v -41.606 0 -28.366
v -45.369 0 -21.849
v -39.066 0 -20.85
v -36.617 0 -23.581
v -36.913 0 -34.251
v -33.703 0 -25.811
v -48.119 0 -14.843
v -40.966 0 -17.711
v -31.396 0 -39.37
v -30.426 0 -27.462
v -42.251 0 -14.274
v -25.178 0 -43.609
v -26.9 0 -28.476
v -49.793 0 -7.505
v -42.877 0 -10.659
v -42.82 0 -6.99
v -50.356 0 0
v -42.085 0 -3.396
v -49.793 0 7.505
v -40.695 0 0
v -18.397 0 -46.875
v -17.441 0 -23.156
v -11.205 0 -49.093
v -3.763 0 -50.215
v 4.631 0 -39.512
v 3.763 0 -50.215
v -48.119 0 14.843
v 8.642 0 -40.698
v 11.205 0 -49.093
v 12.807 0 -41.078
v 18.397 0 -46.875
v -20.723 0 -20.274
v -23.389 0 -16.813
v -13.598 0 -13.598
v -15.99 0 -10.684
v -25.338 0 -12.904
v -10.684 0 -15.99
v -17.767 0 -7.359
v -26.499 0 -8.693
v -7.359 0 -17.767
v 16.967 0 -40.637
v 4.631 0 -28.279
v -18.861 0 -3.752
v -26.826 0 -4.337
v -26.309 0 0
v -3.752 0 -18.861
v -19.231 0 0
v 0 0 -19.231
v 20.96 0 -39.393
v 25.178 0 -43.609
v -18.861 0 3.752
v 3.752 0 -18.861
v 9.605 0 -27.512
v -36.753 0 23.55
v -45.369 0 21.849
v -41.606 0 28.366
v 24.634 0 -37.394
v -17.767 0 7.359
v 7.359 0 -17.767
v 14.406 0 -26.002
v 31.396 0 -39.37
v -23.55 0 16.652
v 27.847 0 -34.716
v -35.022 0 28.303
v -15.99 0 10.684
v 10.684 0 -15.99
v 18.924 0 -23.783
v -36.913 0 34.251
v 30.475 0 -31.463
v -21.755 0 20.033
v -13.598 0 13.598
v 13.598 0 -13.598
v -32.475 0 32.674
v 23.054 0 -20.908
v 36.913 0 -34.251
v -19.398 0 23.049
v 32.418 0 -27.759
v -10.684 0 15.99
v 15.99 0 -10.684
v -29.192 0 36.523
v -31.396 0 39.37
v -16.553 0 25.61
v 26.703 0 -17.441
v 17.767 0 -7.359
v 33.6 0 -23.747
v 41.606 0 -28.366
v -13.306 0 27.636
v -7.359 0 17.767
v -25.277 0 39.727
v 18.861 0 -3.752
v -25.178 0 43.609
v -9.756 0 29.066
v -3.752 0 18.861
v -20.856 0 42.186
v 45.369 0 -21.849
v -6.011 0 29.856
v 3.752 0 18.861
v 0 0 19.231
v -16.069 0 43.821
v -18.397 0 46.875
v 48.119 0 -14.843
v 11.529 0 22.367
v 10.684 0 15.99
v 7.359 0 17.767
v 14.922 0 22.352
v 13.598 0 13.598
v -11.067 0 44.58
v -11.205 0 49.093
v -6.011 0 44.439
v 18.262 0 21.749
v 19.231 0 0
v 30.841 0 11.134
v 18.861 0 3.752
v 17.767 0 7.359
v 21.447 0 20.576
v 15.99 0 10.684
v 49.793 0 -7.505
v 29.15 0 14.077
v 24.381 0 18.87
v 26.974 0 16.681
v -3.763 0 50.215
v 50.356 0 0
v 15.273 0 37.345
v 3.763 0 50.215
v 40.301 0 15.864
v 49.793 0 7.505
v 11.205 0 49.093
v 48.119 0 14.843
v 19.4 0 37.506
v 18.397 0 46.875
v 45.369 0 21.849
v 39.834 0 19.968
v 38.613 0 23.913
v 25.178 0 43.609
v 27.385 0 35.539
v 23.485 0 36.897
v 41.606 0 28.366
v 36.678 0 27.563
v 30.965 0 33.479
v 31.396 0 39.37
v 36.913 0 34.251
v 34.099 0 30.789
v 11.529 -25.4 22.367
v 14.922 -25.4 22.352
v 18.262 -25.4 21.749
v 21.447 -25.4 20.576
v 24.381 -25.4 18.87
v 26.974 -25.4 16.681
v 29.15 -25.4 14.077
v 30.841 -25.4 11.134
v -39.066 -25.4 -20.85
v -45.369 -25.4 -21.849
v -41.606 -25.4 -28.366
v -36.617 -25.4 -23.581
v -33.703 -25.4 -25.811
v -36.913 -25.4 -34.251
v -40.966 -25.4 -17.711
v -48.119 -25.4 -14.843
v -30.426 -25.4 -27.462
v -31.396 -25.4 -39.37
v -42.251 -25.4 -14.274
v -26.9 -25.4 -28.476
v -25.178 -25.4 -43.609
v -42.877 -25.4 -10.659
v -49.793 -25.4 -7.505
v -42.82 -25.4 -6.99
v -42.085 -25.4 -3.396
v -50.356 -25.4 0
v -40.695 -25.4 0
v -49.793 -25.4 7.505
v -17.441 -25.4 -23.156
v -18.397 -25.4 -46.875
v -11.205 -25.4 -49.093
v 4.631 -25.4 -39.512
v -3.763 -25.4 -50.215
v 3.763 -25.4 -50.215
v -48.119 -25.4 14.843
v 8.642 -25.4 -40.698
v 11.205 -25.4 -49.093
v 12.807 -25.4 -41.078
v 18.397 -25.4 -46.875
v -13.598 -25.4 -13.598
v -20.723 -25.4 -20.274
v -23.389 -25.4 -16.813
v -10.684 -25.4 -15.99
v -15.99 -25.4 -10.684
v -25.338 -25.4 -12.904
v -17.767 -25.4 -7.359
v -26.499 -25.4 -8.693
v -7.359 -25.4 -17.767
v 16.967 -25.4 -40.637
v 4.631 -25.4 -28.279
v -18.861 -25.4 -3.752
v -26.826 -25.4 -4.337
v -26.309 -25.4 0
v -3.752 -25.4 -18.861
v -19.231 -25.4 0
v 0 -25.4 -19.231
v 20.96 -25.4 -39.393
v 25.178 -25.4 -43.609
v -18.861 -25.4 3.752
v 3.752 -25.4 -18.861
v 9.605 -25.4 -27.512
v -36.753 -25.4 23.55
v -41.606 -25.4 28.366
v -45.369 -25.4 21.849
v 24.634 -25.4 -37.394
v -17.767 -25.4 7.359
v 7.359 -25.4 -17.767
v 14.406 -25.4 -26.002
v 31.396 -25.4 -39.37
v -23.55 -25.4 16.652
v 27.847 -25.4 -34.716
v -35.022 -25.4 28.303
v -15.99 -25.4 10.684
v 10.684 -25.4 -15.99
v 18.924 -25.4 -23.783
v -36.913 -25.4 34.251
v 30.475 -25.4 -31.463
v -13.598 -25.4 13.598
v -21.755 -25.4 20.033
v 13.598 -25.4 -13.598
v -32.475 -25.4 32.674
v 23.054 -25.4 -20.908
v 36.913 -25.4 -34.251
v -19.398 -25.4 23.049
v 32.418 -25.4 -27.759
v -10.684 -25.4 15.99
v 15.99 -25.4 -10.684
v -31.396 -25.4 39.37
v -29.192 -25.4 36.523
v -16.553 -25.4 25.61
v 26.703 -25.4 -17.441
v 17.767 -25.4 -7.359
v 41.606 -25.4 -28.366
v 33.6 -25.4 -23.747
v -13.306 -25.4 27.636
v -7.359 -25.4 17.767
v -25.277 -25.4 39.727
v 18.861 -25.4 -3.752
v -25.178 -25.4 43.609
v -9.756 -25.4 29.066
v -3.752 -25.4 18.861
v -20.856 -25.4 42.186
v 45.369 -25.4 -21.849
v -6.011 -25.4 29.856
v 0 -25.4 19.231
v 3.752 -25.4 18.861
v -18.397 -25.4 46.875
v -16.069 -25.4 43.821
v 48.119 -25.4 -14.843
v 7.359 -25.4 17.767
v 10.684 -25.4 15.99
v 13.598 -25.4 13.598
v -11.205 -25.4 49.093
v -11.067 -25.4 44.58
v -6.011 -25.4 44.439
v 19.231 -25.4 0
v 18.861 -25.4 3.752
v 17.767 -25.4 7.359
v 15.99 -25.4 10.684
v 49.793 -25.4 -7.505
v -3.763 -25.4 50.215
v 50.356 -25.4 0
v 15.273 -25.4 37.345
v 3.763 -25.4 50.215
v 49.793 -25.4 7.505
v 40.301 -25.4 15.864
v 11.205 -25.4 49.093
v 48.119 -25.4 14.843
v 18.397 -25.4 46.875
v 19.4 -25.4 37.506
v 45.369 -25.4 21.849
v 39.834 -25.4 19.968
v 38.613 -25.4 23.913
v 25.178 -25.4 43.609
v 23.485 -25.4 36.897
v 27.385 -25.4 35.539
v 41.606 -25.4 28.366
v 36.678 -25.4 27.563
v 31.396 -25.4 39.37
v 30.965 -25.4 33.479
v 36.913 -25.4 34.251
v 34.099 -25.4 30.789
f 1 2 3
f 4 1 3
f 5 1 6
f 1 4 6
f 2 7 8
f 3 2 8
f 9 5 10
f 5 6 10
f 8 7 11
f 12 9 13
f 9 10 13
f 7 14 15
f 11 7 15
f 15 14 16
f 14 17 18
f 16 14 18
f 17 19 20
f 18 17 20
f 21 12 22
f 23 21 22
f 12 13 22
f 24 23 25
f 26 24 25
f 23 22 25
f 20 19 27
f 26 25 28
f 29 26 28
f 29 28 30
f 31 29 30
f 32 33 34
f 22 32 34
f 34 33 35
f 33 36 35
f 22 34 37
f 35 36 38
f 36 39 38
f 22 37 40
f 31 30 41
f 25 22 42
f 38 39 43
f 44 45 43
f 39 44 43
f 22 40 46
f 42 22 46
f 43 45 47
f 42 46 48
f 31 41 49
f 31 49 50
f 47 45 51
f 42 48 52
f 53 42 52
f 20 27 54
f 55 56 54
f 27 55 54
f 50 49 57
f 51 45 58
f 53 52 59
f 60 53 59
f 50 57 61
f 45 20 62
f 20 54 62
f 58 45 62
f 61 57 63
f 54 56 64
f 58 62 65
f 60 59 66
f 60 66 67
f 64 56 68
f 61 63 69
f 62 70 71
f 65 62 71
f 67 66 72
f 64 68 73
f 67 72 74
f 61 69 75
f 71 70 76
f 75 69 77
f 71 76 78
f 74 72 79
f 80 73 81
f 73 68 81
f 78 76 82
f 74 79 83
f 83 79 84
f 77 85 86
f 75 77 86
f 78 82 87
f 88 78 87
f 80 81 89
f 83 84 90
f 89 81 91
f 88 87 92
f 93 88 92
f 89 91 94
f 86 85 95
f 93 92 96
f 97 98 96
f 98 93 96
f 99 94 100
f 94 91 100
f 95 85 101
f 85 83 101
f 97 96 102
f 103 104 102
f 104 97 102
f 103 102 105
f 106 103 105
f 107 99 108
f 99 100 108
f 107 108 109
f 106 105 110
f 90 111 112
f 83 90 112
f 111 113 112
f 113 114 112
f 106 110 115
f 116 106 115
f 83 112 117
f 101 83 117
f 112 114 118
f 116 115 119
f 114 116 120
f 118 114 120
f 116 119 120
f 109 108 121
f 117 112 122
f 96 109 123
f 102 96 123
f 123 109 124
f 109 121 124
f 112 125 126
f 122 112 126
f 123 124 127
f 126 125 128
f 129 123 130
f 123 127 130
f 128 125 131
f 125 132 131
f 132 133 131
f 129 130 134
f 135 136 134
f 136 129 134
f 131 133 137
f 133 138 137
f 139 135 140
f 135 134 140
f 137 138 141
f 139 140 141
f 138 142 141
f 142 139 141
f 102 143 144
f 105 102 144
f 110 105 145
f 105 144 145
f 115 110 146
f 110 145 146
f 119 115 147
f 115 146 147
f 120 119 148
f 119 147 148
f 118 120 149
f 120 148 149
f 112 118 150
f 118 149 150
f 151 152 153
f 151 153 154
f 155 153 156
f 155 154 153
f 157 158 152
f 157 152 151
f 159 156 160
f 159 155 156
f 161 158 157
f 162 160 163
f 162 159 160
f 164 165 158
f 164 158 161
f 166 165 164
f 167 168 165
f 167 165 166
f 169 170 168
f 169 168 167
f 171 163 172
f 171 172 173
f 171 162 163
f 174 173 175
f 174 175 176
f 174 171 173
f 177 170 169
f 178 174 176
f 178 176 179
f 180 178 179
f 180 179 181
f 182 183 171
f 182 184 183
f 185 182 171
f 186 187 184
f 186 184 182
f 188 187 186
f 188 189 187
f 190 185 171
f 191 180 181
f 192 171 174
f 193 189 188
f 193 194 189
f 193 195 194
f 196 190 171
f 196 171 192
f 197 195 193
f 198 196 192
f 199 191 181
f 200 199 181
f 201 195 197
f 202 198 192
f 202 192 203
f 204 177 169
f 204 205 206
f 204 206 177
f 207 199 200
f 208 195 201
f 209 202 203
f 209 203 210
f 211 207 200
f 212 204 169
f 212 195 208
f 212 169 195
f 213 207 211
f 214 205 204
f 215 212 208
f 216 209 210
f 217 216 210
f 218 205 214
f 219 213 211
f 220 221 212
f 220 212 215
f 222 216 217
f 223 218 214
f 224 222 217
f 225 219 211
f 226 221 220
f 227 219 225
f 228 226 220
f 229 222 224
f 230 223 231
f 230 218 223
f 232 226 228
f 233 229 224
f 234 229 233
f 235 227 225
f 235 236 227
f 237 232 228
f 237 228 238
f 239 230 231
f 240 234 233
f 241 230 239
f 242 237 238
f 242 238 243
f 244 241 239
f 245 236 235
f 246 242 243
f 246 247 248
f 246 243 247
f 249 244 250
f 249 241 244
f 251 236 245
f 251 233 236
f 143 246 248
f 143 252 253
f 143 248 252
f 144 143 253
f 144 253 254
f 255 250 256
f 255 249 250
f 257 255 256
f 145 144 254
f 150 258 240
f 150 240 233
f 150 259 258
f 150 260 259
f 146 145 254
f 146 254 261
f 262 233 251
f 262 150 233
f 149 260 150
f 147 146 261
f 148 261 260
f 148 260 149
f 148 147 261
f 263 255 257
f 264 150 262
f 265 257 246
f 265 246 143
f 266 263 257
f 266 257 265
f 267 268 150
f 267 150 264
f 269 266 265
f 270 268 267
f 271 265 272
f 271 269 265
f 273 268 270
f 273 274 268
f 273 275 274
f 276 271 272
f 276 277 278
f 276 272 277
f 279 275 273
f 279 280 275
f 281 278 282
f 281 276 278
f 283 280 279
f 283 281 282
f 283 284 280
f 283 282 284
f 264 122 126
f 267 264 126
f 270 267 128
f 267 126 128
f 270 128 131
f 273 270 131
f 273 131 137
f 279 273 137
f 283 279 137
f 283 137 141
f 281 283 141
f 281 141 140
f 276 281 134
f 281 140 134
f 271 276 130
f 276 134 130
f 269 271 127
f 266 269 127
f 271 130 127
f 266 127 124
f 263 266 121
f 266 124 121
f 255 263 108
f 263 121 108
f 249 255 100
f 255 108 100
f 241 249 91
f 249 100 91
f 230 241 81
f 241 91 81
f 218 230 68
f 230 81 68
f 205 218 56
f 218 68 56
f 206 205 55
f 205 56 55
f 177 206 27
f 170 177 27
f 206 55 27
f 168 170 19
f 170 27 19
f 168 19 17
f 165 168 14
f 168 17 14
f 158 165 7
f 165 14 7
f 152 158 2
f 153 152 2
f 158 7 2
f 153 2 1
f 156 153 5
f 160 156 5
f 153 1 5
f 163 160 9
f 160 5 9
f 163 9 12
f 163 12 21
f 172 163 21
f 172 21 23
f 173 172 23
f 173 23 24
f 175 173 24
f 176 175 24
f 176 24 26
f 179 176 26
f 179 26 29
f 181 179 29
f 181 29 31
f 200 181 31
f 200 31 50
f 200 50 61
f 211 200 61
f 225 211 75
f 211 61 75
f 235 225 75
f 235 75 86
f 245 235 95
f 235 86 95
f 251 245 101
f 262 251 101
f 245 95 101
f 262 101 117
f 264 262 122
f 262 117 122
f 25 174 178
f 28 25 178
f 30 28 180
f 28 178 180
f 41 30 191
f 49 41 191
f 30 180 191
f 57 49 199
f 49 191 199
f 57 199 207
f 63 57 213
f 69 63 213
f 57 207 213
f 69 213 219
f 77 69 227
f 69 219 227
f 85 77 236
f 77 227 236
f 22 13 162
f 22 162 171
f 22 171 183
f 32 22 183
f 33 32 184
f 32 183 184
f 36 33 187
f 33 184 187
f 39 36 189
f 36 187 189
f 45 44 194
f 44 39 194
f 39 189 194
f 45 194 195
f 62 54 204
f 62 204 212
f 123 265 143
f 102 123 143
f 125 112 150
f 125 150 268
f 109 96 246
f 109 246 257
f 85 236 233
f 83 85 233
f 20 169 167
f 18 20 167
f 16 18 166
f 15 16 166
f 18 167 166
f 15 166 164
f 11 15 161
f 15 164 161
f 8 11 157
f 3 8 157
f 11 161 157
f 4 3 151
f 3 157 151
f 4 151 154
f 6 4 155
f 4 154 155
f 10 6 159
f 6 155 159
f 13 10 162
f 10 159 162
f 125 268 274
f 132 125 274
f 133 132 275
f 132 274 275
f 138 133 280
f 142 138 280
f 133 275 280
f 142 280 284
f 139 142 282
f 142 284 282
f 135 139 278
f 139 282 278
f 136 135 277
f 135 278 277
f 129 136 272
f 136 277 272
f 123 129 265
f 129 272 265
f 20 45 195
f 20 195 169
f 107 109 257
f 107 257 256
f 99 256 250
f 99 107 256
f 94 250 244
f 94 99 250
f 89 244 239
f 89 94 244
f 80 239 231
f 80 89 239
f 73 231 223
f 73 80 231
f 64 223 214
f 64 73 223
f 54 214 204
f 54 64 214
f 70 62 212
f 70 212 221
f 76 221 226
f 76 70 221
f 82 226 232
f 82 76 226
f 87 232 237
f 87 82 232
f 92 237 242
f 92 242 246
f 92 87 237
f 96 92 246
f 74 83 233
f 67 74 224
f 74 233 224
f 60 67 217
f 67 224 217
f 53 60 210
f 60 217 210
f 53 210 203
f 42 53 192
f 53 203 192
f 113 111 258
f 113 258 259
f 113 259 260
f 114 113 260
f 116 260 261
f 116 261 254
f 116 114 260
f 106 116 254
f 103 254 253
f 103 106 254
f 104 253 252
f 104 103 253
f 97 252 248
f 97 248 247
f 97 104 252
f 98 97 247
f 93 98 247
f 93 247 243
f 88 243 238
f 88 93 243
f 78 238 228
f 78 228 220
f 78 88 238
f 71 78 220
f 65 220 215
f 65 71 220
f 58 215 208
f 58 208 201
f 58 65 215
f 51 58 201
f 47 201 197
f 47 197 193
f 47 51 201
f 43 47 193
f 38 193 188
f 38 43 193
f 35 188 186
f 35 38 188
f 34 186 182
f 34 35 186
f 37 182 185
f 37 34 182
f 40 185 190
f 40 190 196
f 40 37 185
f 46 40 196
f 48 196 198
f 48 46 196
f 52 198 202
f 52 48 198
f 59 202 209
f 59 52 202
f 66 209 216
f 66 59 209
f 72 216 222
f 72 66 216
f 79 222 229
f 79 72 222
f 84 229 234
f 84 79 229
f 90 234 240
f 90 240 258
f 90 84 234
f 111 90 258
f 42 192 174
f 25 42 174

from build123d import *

# Parameters (mm, degrees)
F0_R     = 50.355845
F0_R_2   = 19.23064
F2_DEPTH = 25.4
F3_DEPTH = 159.512
F6_DEPTH = 39.624
F7_DEPTH = 60.452


with BuildPart() as f2:
    # F0 (on Front) → F2 (new body)
    with BuildSketch(Plane.XZ):
        Circle(F0_R)
        Circle(F0_R_2, mode=Mode.SUBTRACT)
    extrude(amount=F2_DEPTH)

    # F1 (on face) → F3 (cut)
    with BuildSketch(Plane.XZ):
        with BuildLine():
            ThreePointArc((-6.010604, 44.439051), (-25.277411, 39.727291), (-36.75336, 23.549741))
            Line((-36.75336, 23.549741), (-23.549741, 16.652327))
            ThreePointArc((-23.549741, 16.652327), (-16.553358, 25.609562), (-6.010604, 29.855948))
            Line((-6.010604, 29.855948), (-6.010604, 44.439051))
        make_face()
    extrude(amount=F3_DEPTH, mode=Mode.SUBTRACT)

    # F4 (on face) → F6 (cut)
    with BuildSketch(Plane.XZ.offset(25.4)):
        with BuildLine():
            ThreePointArc((-17.440604, -23.155604), (-25.338416, -12.904348), (-26.308708, 0))
            Line((-26.308708, 0), (-40.69474, 0))
            ThreePointArc((-40.69474, 0), (-40.96629, -17.711086), (-26.899915, -28.476467))
            Line((-26.899915, -28.476467), (-17.440604, -23.155604))
        make_face()
    extrude(amount=-F6_DEPTH, mode=Mode.SUBTRACT)

    # F5 (on face) → F7 (cut)
    with BuildSketch(Plane.XZ.offset(25.4)):
        with BuildLine():
            Line((15.272845, 37.344571), (11.528536, 22.367328))
            ThreePointArc((11.528536, 22.367328), (22.950874, 19.787073), (30.841293, 11.134396))
            Line((30.841293, 11.134396), (40.300604, 15.864052))
            ThreePointArc((40.300604, 15.864052), (32.595246, 32.2069), (15.272845, 37.344571))
        make_face()
        with BuildLine():
            ThreePointArc((26.702844, -17.440604), (16.707275, -24.978413), (4.631122, -28.279396))
            Line((4.631122, -28.279396), (4.631122, -39.512329))
            ThreePointArc((4.631122, -39.512329), (22.846027, -38.484063), (33.600256, -23.746809))
            Line((33.600256, -23.746809), (26.702844, -17.440604))
        make_face()
    extrude(amount=-F7_DEPTH, mode=Mode.SUBTRACT)


solid = f2.part
